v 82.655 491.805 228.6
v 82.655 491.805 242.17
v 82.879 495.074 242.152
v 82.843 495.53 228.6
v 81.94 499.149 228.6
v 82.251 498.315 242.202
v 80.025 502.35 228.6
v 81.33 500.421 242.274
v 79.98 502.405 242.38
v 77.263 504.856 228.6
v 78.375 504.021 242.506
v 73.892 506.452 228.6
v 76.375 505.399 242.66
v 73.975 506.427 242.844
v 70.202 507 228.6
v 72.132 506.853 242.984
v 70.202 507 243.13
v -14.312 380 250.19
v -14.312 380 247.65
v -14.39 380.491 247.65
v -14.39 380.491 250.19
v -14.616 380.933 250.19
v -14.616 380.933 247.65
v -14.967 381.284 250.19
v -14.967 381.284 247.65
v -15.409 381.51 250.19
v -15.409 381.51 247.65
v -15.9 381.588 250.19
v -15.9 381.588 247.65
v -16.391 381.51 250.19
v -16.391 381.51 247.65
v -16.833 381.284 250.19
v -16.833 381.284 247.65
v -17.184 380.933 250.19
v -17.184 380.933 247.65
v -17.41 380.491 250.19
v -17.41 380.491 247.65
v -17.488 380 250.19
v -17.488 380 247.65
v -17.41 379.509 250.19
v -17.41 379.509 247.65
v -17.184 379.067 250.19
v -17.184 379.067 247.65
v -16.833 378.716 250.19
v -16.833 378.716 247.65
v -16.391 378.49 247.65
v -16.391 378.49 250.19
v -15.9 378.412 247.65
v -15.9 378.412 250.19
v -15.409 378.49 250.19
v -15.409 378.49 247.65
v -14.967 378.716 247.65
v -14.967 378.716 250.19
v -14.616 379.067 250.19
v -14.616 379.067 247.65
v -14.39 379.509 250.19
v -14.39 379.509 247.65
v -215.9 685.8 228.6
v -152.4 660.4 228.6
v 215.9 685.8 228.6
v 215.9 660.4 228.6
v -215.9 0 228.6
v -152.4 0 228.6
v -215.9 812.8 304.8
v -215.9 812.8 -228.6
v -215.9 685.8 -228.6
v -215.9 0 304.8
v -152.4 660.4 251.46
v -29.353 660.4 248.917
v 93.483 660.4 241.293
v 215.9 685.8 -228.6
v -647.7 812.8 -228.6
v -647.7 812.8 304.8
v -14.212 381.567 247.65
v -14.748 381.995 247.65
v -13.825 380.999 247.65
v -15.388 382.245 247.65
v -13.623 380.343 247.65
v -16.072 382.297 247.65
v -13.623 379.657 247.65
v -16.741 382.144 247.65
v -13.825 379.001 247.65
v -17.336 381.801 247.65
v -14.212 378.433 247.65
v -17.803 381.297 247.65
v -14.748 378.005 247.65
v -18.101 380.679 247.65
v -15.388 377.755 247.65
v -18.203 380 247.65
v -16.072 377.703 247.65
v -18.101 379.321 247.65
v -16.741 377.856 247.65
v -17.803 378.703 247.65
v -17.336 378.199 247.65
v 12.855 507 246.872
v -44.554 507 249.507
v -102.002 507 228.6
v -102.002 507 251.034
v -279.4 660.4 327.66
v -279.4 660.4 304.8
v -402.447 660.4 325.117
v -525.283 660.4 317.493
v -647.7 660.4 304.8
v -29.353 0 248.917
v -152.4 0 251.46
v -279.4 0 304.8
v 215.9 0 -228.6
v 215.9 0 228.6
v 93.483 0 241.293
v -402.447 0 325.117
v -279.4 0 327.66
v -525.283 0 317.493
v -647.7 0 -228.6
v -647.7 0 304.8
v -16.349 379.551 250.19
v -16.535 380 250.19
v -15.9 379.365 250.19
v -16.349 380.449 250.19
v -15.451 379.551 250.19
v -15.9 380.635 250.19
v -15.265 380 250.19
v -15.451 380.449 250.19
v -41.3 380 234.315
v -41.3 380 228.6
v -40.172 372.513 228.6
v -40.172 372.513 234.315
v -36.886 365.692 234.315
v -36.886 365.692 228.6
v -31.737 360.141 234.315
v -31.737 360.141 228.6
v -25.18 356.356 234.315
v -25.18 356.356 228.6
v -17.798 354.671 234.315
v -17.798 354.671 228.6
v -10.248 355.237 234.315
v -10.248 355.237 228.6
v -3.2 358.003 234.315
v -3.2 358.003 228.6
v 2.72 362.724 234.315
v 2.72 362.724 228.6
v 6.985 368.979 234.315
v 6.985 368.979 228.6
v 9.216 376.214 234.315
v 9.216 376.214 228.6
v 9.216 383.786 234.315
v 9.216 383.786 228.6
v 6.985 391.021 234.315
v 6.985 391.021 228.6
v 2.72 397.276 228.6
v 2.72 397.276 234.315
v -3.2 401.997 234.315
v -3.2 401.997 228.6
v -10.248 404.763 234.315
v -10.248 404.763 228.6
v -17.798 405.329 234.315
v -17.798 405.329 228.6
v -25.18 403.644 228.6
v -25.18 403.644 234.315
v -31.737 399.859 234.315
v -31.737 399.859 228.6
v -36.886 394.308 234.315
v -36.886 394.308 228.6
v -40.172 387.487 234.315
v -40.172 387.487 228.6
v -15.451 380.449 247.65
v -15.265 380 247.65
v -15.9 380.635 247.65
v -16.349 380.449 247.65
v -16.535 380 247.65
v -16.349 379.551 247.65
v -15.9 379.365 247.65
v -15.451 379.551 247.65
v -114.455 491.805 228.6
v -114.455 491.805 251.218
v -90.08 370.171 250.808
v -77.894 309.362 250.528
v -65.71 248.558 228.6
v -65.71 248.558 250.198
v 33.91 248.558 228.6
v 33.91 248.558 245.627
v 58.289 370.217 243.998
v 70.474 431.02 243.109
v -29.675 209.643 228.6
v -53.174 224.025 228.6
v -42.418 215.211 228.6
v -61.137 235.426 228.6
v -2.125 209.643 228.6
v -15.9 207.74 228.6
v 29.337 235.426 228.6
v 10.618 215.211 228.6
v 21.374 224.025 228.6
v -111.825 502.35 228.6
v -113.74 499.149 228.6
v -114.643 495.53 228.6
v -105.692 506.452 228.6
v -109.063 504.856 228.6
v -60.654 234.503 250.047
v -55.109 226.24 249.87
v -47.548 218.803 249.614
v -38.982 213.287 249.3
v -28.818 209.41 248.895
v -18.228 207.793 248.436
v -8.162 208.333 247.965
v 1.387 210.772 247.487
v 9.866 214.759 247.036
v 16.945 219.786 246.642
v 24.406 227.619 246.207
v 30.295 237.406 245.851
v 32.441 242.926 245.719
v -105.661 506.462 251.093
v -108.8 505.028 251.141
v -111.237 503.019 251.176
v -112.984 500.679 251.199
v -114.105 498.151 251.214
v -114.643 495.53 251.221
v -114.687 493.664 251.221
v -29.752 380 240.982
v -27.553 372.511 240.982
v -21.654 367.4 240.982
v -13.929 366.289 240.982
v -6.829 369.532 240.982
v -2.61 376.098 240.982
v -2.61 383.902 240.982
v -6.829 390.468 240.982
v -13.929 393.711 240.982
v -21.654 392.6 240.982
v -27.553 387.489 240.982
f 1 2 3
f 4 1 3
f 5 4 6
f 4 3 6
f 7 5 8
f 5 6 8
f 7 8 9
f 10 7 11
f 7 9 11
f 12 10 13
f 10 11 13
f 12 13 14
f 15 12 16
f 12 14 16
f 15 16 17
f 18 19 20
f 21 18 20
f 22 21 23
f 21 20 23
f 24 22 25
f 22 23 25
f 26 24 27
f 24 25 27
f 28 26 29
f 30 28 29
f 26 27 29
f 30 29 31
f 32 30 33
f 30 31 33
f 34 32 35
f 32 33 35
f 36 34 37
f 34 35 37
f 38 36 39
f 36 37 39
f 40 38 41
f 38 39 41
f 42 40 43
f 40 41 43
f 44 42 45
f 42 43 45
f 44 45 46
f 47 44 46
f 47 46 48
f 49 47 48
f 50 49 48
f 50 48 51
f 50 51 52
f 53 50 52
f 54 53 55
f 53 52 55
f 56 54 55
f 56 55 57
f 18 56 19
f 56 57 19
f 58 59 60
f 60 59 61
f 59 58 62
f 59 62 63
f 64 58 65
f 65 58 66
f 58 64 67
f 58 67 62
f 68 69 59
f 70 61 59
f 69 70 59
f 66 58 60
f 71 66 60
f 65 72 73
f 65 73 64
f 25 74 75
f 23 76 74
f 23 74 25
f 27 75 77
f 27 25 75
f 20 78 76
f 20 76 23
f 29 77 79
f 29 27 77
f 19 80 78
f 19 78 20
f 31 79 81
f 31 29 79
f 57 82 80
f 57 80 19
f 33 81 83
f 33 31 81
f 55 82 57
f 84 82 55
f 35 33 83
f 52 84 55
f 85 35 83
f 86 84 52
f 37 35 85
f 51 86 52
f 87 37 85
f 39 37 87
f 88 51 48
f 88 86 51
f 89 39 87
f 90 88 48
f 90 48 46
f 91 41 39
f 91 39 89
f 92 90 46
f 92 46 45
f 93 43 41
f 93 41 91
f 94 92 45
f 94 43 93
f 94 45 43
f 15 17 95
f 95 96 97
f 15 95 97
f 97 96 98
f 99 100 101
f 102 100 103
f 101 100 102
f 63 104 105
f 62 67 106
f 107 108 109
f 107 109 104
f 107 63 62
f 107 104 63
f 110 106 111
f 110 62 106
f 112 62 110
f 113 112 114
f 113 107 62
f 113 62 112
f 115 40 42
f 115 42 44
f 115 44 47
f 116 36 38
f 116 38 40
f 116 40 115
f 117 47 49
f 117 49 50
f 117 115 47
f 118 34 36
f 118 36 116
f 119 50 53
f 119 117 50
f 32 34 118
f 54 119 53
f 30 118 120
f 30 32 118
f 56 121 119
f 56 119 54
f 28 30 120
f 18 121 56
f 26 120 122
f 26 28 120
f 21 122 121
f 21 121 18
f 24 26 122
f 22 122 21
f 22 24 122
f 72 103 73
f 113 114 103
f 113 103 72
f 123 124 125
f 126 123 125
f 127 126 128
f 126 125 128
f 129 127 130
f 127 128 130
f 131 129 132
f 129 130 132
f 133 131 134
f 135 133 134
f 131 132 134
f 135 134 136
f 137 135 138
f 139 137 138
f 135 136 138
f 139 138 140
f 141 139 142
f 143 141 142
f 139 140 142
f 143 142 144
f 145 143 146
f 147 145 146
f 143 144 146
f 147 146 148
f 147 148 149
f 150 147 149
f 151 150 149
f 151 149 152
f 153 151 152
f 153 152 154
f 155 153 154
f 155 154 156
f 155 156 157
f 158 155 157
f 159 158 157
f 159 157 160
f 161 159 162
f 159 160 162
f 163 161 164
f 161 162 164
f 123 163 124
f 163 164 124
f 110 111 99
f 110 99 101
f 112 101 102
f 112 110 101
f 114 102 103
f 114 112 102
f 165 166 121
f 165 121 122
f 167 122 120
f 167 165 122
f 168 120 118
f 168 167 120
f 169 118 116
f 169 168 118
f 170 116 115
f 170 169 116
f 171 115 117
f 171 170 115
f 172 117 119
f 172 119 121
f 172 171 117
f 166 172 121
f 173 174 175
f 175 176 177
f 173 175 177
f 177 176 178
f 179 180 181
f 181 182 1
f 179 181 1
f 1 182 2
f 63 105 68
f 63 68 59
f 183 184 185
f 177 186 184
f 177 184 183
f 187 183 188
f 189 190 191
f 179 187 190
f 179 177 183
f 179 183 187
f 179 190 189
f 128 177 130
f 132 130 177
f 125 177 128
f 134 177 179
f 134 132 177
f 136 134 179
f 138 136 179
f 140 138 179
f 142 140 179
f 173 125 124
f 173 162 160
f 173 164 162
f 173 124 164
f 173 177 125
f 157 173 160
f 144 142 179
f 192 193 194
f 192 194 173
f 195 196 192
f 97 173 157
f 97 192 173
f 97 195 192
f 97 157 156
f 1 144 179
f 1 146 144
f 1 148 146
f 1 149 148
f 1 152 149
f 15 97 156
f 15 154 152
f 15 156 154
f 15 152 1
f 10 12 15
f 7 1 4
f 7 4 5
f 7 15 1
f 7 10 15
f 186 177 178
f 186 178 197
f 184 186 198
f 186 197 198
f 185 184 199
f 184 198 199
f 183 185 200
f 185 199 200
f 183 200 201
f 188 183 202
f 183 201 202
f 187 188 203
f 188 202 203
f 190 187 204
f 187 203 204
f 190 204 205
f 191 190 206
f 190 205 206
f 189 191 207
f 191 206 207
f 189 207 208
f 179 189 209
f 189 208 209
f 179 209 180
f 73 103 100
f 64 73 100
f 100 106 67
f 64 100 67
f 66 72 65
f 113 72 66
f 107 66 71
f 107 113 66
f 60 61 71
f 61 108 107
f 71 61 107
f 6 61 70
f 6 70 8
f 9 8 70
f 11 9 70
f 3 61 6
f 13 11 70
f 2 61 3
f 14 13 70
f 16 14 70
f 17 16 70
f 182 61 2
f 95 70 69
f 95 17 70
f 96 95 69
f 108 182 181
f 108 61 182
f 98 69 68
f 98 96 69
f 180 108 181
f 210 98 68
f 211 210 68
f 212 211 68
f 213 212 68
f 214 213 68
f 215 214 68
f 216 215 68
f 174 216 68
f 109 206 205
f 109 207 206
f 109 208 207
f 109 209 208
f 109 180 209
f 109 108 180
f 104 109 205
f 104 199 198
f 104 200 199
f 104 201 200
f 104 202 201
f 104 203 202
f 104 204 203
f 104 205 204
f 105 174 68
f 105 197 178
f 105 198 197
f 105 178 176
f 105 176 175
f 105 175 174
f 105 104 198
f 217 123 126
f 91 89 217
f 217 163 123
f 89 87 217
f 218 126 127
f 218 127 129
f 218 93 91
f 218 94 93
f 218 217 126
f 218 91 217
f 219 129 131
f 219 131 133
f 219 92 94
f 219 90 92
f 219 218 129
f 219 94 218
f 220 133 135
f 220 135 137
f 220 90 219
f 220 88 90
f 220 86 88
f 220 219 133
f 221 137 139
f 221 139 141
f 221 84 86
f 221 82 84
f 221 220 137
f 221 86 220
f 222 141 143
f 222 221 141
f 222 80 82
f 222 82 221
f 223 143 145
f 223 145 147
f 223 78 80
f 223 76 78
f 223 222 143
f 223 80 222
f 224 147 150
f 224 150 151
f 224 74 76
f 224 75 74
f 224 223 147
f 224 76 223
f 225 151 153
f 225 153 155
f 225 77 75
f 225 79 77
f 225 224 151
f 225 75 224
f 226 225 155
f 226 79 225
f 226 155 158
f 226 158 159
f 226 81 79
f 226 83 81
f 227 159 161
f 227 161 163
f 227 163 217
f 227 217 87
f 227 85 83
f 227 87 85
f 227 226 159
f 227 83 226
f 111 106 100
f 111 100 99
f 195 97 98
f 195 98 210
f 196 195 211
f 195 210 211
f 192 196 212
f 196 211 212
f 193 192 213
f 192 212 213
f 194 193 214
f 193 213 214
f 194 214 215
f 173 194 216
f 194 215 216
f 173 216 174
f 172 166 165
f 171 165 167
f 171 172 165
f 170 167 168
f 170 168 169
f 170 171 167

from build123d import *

# Parameters (mm, degrees)
SKETCH1_W           = 431.8
SKETCH1_H           = 457.2
BOSS_EXTRUDE1_DEPTH = 685.8
SKETCH2_W           = 431.8
SKETCH2_H           = 533.4
BOSS_EXTRUDE2_DEPTH = 812.8
BOSS_EXTRUDE4_DEPTH = 660.4
BOSS_EXTRUDE3_DEPTH = 660.4
CUT_EXTRUDE3_DEPTH  = 76.2
SKETCH7_R           = 25.4
BOSS_EXTRUDE5_DEPTH = 19.05
CHAMFER1_SIZE       = 13.335
CHAMFER1_SIZE2      = 23.096897519
SKETCH8_R           = 1.5875
SKETCH8_R_2         = 0.635
BOSS_EXTRUDE6_DEPTH = 2.54


with BuildPart() as part:
    # Sketch1 → Boss-Extrude1 (new body)
    with BuildSketch(Plane(origin=(0, 0, 0), x_dir=(1, 0, 0), z_dir=(0, 1, 0))):
        Rectangle(SKETCH1_W, SKETCH1_H)
    extrude(amount=BOSS_EXTRUDE1_DEPTH)

    # Sketch2 → Boss-Extrude2 (add)
    with BuildSketch(Plane(origin=(0, 0, 0), x_dir=(1, 0, 0), z_dir=(0, 1, 0))):
        with Locations((-431.8, -38.1)):
            Rectangle(SKETCH2_W, SKETCH2_H)
    extrude(amount=BOSS_EXTRUDE2_DEPTH)

    # Sketch4 → Boss-Extrude4 (add)
    with BuildSketch(Plane(origin=(0, 0, 0), x_dir=(1, 0, 0), z_dir=(0, 1, 0))):
        with BuildLine():
            Line((-152.4, -251.46), (-152.4, -228.6))
            Line((-152.4, -228.6), (215.9, -228.6))
            ThreePointArc((215.9, -228.6), (32.104383146, -245.739506237), (-152.4, -251.46))
        make_face()
    extrude(amount=BOSS_EXTRUDE4_DEPTH)

    # Sketch3 → Boss-Extrude3 (add)
    with BuildSketch(Plane(origin=(0, 0, 0), x_dir=(1, 0, 0), z_dir=(0, 1, 0))):
        with BuildLine():
            Line((-279.4, -304.8), (-279.4, -327.66))
            ThreePointArc((-279.4, -327.66), (-463.904383146, -321.939506237), (-647.7, -304.8))
            Line((-647.7, -304.8), (-279.4, -304.8))
        make_face()
    extrude(amount=BOSS_EXTRUDE3_DEPTH)

    # Sketch6 → Cut-Extrude3 (cut)
    with BuildSketch(Plane.XY.offset(304.8)):
        with BuildLine():
            Line((33.909716126, 248.55832752), (82.654926159, 491.804601993))
            ThreePointArc((82.654926159, 491.804601993), (80.025469047, 502.349796436), (70.202497127, 507))
            Line((70.202497127, 507), (-102.002497127, 507))
            ThreePointArc((-102.002497127, 507), (-111.825469047, 502.349796436), (-114.454926159, 491.804601993))
            Line((-114.454926159, 491.804601993), (-65.709716126, 248.55832752))
            ThreePointArc((-65.709716126, 248.55832752), (-15.9, 207.739919548), (33.909716126, 248.55832752))
        make_face()
    extrude(amount=-CUT_EXTRUDE3_DEPTH, mode=Mode.SUBTRACT)



with BuildPart() as body_2:
    # Sketch7 → Boss-Extrude5 (new body)
    with BuildSketch(Plane.XY.offset(228.6)):
        with Locations(Location((-15.9, 380, 0), (0, 0, 180))):
            Circle(SKETCH7_R)
    extrude(amount=BOSS_EXTRUDE5_DEPTH)

    # Chamfer1
    chamfer1_edges = [body_2.edges().sort_by_distance(p)[0] for p in [
        (9.5, 380, 247.65),
    ]]
    chamfer1_side = [body_2.faces().sort_by_distance(p)[0] for p in [
        (9.5, 380, 238.125),
    ]]
    chamfer(chamfer1_edges, length=CHAMFER1_SIZE, length2=CHAMFER1_SIZE2, reference=chamfer1_side[0])


with BuildPart() as part_1:
    add(part.part)

    add(body_2.part)  # Boss-Extrude6 merges body 2
    # Sketch8 → Boss-Extrude6 (add)
    with BuildSketch(Plane.XY.offset(247.65)):
        with Locations((-15.9, 380)):
            Circle(SKETCH8_R)
        with Locations((-15.9, 380)):
            Circle(SKETCH8_R_2, mode=Mode.SUBTRACT)
    extrude(amount=BOSS_EXTRUDE6_DEPTH)


solid = part_1.part
